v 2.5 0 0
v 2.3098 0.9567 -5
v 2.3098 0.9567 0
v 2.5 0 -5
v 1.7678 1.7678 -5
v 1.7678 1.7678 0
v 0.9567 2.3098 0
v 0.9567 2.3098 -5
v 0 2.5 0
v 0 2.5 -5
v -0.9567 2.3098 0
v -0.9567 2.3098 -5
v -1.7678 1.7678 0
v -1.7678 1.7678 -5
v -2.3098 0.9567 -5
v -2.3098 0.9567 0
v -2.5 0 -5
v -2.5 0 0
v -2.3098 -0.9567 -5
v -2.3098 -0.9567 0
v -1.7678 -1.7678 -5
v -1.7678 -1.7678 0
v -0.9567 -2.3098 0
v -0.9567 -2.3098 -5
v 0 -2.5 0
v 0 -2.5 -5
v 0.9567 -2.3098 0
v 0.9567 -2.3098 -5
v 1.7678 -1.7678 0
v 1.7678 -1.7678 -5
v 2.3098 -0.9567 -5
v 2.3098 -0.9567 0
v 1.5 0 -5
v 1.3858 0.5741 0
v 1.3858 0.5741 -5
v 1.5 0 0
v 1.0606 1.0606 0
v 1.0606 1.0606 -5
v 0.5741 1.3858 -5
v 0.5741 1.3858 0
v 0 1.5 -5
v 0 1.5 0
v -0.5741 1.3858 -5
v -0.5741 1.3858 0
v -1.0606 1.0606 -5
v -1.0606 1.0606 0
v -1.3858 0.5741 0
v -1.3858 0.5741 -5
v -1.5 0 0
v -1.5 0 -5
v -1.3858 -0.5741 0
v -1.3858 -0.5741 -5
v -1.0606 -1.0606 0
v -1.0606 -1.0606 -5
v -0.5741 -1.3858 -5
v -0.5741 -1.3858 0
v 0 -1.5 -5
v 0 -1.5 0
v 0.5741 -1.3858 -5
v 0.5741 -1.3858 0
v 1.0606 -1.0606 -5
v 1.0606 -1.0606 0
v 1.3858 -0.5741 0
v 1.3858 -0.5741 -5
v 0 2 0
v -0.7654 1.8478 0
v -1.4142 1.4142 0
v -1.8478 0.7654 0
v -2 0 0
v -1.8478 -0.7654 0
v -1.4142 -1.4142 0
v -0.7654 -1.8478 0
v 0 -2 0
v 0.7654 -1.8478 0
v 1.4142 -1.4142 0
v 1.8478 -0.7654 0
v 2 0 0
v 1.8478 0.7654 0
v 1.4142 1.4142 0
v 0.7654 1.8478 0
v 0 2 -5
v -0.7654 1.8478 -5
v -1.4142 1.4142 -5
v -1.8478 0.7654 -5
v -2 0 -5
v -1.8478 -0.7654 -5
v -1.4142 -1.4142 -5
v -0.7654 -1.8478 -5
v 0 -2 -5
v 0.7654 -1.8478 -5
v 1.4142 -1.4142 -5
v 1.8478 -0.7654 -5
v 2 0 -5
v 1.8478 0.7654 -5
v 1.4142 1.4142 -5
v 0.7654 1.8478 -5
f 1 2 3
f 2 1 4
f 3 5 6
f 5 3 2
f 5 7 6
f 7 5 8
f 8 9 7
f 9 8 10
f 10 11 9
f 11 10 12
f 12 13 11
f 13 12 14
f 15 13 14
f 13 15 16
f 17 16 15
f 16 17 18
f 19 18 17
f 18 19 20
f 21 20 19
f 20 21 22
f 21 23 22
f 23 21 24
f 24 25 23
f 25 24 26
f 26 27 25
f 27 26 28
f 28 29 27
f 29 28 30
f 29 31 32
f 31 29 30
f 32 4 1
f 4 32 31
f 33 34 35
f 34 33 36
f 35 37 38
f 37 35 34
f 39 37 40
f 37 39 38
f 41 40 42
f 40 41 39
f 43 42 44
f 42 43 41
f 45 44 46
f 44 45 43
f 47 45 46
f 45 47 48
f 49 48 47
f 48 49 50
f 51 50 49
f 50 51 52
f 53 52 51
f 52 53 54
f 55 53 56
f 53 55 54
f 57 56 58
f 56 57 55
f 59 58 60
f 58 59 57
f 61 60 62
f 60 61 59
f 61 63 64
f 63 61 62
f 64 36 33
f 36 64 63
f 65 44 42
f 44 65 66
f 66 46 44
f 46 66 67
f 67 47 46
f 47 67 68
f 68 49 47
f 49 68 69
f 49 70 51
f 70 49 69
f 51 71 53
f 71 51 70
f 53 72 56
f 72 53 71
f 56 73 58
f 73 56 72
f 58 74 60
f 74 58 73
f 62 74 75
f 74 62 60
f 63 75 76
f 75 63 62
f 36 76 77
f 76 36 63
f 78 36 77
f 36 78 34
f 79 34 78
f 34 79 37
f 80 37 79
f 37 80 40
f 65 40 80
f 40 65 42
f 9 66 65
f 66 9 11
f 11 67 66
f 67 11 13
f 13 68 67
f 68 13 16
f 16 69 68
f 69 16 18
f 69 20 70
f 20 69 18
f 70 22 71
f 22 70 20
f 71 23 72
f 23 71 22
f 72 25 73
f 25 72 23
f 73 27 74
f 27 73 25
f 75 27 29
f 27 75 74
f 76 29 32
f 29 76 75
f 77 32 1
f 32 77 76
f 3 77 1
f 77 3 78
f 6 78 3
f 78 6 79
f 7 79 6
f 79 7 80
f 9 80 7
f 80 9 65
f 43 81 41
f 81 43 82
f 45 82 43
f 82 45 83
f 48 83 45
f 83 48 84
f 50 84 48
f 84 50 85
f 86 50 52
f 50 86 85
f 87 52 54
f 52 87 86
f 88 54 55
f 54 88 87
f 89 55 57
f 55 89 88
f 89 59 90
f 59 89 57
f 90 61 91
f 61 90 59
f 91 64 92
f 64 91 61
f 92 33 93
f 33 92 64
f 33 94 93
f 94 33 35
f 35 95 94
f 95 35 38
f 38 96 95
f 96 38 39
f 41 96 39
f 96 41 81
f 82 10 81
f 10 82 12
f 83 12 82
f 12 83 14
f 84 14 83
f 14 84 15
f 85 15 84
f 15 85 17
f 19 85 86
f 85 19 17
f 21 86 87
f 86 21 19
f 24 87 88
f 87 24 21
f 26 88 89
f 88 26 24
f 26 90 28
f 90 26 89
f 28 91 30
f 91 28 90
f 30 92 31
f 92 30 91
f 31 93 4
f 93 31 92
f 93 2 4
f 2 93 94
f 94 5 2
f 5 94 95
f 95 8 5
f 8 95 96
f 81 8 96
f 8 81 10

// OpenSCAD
// file: ../p/4-4disc.scad
use <../lib.scad>
$fa=1; $fs=0.2;
function ldraw_lib__4_4disc(realsolid=false) = [
// 0 Disc 1.0
// 0 Name: 4-4disc.dat
// 0 Author: James Jessiman
// 0 !LDRAW_ORG Primitive UPDATE 2002-02
// 0 !LICENSE Licensed under CC BY 2.0 and CC BY 4.0 : see CAreadme.txt
// 
// 0 BFC CERTIFY CCW
  [0,"BFC","CERTIFY"],
  [0,"BFC","CCW"],
// 
// 0 !HISTORY 1998-12-15 [PTadmin] Official Update 1998-10
// 0 !HISTORY 2002-03-23 [sbliss] Added BFC statement
// 0 !HISTORY 2002-04-25 [PTadmin] Official Update 2002-02
// 0 !HISTORY 2007-06-24 [PTadmin] Header formatted for Contributor Agreement
// 0 !HISTORY 2008-07-01 [PTadmin] Official Update 2008-01
// 
// 
// 3 16 0 0 0 1 0 0 0.9239 0 0.3827
  [3,16,0,0,0,1,0,0,0.9239,0,0.3827],
// 3 16 0 0 0 0.9239 0 0.3827 0.7071 0 0.7071
  [3,16,0,0,0,0.9239,0,0.3827,0.7071,0,0.7071],
// 3 16 0 0 0 0.7071 0 0.7071 0.3827 0 0.9239
  [3,16,0,0,0,0.7071,0,0.7071,0.3827,0,0.9239],
// 3 16 0 0 0 0.3827 0 0.9239 0 0 1
  [3,16,0,0,0,0.3827,0,0.9239,0,0,1],
// 3 16 0 0 0 0 0 1 -0.3827 0 0.9239
  [3,16,0,0,0,0,0,1,-0.3827,0,0.9239],
// 3 16 0 0 0 -0.3827 0 0.9239 -0.7071 0 0.7071
  [3,16,0,0,0,-0.3827,0,0.9239,-0.7071,0,0.7071],
// 3 16 0 0 0 -0.7071 0 0.7071 -0.9239 0 0.3827
  [3,16,0,0,0,-0.7071,0,0.7071,-0.9239,0,0.3827],
// 3 16 0 0 0 -0.9239 0 0.3827 -1 0 -0
  [3,16,0,0,0,-0.9239,0,0.3827,-1,0,-0],
// 3 16 0 0 0 -1 0 -0 -0.9239 0 -0.3827
  [3,16,0,0,0,-1,0,-0,-0.9239,0,-0.3827],
// 3 16 0 0 0 -0.9239 0 -0.3827 -0.7071 0 -0.7071
  [3,16,0,0,0,-0.9239,0,-0.3827,-0.7071,0,-0.7071],
// 3 16 0 0 0 -0.7071 0 -0.7071 -0.3827 0 -0.9239
  [3,16,0,0,0,-0.7071,0,-0.7071,-0.3827,0,-0.9239],
// 3 16 0 0 0 -0.3827 0 -0.9239 0 0 -1
  [3,16,0,0,0,-0.3827,0,-0.9239,0,0,-1],
// 3 16 0 0 0 0 0 -1 0.3827 0 -0.9239
  [3,16,0,0,0,0,0,-1,0.3827,0,-0.9239],
// 3 16 0 0 0 0.3827 0 -0.9239 0.7071 0 -0.7071
  [3,16,0,0,0,0.3827,0,-0.9239,0.7071,0,-0.7071],
// 3 16 0 0 0 0.7071 0 -0.7071 0.9239 0 -0.3827
  [3,16,0,0,0,0.7071,0,-0.7071,0.9239,0,-0.3827],
// 3 16 0 0 0 0.9239 0 -0.3827 1 0 0
  [3,16,0,0,0,0.9239,0,-0.3827,1,0,0],
// 0
];
module ldraw_lib__4_4disc(step=0, col=false, unit=2/5, alt=false, line=0.2, solid=!$preview)
    makepoly(ldraw_lib__4_4disc(solid), step=step, col=col, unit=unit, alt=alt, line=line, solid=solid);
ldraw_lib__4_4disc(line=0.2);
// file: ../p/stud3.scad
use <../lib.scad>
use <4-4cyli.scad>
use <4-4disc.scad>
use <4-4edge.scad>
$fa=1; $fs=0.2;
function ldraw_lib__stud3(realsolid=false) = realsolid ? 
    [openscad(translate([0,0,-eps()], o=cylinder(4+eps(), r=4)),2)] : [
// 0 Stud Tube Solid
// 0 Name: stud3.dat
// 0 Author: James Jessiman
// 0 !LDRAW_ORG Primitive UPDATE 2012-01
// 0 !LICENSE Licensed under CC BY 2.0 and CC BY 4.0 : see CAreadme.txt
// 
// 0 BFC CERTIFY CCW
  [0,"BFC","CERTIFY"],
  [0,"BFC","CCW"],
// 
// 0 !HISTORY 2002-04-04 [sbliss] Modified for BFC compliance
// 0 !HISTORY 2002-04-25 [PTadmin] Official Update 2002-02
// 0 !HISTORY 2007-06-24 [PTadmin] Header formatted for Contributor Agreement
// 0 !HISTORY 2008-07-01 [PTadmin] Official Update 2008-01
// 0 !HISTORY 2012-02-16 [Philo] Changed to CCW
// 0 !HISTORY 2012-03-30 [PTadmin] Official Update 2012-01
// 
// 
// 1 16 0 -4 0 4 0 0 0 1 0 0 0 4 4-4edge.dat
  [1,16,0,-4,0,4,0,0,0,1,0,0,0,4, ldraw_lib__4_4edge(realsolid)],
// 1 16 0 0 0 4 0 0 0 1 0 0 0 4 4-4edge.dat
  [1,16,0,0,0,4,0,0,0,1,0,0,0,4, ldraw_lib__4_4edge(realsolid)],
// 1 16 0 -4 0 4 0 0 0 1 0 0 0 4 4-4disc.dat
  [1,16,0,-4,0,4,0,0,0,1,0,0,0,4, ldraw_lib__4_4disc(realsolid)],
// 1 16 0 -4 0 4 0 0 0 4 0 0 0 4 4-4cyli.dat
  [1,16,0,-4,0,4,0,0,0,4,0,0,0,4, ldraw_lib__4_4cyli(realsolid)],
];
module ldraw_lib__stud3(step=0, col=false, unit=2/5, alt=false, line=0.2, solid=!$preview)
    makepoly(ldraw_lib__stud3(solid), step=step, col=col, unit=unit, alt=alt, line=line, solid=solid);
ldraw_lib__stud3(line=0.2);
// file: ../p/stud.scad
use <../lib.scad>
use <4-4cyli.scad>
use <4-4disc.scad>
use <4-4edge.scad>
$fa=1; $fs=0.2;
function ldraw_lib__stud(realsolid=false) = realsolid ? 
    [openscad(translate([0,0,-eps()], o=cylinder(4+eps(), r=6)),2)] : [
// 0 Stud
// 0 Name: stud.dat
// 0 Author: James Jessiman
// 0 !LDRAW_ORG Primitive UPDATE 2012-01
// 0 !LICENSE Licensed under CC BY 2.0 and CC BY 4.0 : see CAreadme.txt
// 
// 0 BFC CERTIFY CCW
  [0,"BFC","CERTIFY"],
  [0,"BFC","CCW"],
// 
// 0 !HISTORY 2002-04-04 [sbliss] Modified for BFC compliance
// 0 !HISTORY 2002-04-25 [PTadmin] Official Update 2002-02
// 0 !HISTORY 2007-06-24 [PTadmin] Header formatted for Contributor Agreement
// 0 !HISTORY 2008-07-01 [PTadmin] Official Update 2008-01
// 0 !HISTORY 2012-02-16 [Philo] Changed to CCW
// 0 !HISTORY 2012-03-30 [PTadmin] Official Update 2012-01
// 
// 
// 1 16 0 0 0 6 0 0 0 1 0 0 0 6 4-4edge.dat
  [1,16,0,0,0,6,0,0,0,1,0,0,0,6, ldraw_lib__4_4edge(realsolid)],
// 1 16 0 -4 0 6 0 0 0 1 0 0 0 6 4-4edge.dat
  [1,16,0,-4,0,6,0,0,0,1,0,0,0,6, ldraw_lib__4_4edge(realsolid)],
// 1 16 0 0 0 6 0 0 0 -4 0 0 0 6 4-4cyli.dat
  [1,16,0,0,0,6,0,0,0,-4,0,0,0,6, ldraw_lib__4_4cyli(realsolid)],
// 1 16 0 -4 0 6 0 0 0 1 0 0 0 6 4-4disc.dat
  [1,16,0,-4,0,6,0,0,0,1,0,0,0,6, ldraw_lib__4_4disc(realsolid)],
];
module ldraw_lib__stud(step=0, col=false, unit=2/5, alt=false, line=0.2, solid=!$preview)
    makepoly(ldraw_lib__stud(solid), step=step, col=col, unit=unit, alt=alt, line=line, solid=solid);
ldraw_lib__stud(line=0.2);
// file: ../p/box5.scad
use <../lib.scad>
$fa=1; $fs=0.2;
function ldraw_lib__box5(realsolid=false) = [
// 0 Box with 5 Faces and All Edges
// 0 Name: box5.dat
// 0 Author: James Jessiman
// 0 !LDRAW_ORG Primitive UPDATE 2012-01
// 0 !LICENSE Licensed under CC BY 2.0 and CC BY 4.0 : see CAreadme.txt
// 
// 0 BFC CERTIFY CCW
  [0,"BFC","CERTIFY"],
  [0,"BFC","CCW"],
// 
// 0 !HISTORY 2002-04-03 [sbliss] Modified for BFC compliance
// 0 !HISTORY 2002-04-25 [PTadmin] Official Update 2002-02
// 0 !HISTORY 2007-06-24 [PTadmin] Header formatted for Contributor Agreement
// 0 !HISTORY 2008-07-01 [PTadmin] Official Update 2008-01
// 0 !HISTORY 2012-02-16 [Philo] Changed to CCW
// 0 !HISTORY 2012-03-30 [PTadmin] Official Update 2012-01
// 
// 
// 2 24 1 1 1 -1 1 1
  [2,24,1,1,1,-1,1,1],
// 2 24 -1 1 1 -1 1 -1
  [2,24,-1,1,1,-1,1,-1],
// 2 24 -1 1 -1 1 1 -1
  [2,24,-1,1,-1,1,1,-1],
// 2 24 1 1 -1 1 1 1
  [2,24,1,1,-1,1,1,1],
// 2 24 1 0 1 -1 0 1
  [2,24,1,0,1,-1,0,1],
// 2 24 -1 0 1 -1 0 -1
  [2,24,-1,0,1,-1,0,-1],
// 2 24 -1 0 -1 1 0 -1
  [2,24,-1,0,-1,1,0,-1],
// 2 24 1 0 -1 1 0 1
  [2,24,1,0,-1,1,0,1],
// 2 24 1 0 1 1 1 1
  [2,24,1,0,1,1,1,1],
// 2 24 -1 0 1 -1 1 1
  [2,24,-1,0,1,-1,1,1],
// 2 24 1 0 -1 1 1 -1
  [2,24,1,0,-1,1,1,-1],
// 2 24 -1 0 -1 -1 1 -1
  [2,24,-1,0,-1,-1,1,-1],
// 4 16 -1 1 1 1 1 1 1 1 -1 -1 1 -1
  [4,16,-1,1,1,1,1,1,1,1,-1,-1,1,-1],
// 4 16 -1 1 1 -1 0 1 1 0 1 1 1 1
  [4,16,-1,1,1,-1,0,1,1,0,1,1,1,1],
// 4 16 -1 1 -1 -1 0 -1 -1 0 1 -1 1 1
  [4,16,-1,1,-1,-1,0,-1,-1,0,1,-1,1,1],
// 4 16 1 1 -1 1 0 -1 -1 0 -1 -1 1 -1
  [4,16,1,1,-1,1,0,-1,-1,0,-1,-1,1,-1],
// 4 16 1 1 1 1 0 1 1 0 -1 1 1 -1
  [4,16,1,1,1,1,0,1,1,0,-1,1,1,-1],
];
module ldraw_lib__box5(step=0, col=false, unit=2/5, alt=false, line=0.2, solid=!$preview)
    makepoly(ldraw_lib__box5(solid), step=step, col=col, unit=unit, alt=alt, line=line, solid=solid);
ldraw_lib__box5(line=0.2);
// file: ../p/box4t.scad
use <../lib.scad>
$fa=1; $fs=0.2;
function ldraw_lib__box4t(realsolid=false) = [
// 0 Box with 4 Adjacent Faces and All Edges
// 0 Name: box4t.dat
// 0 Author: Tore Eriksson [Tore_Eriksson]
// 0 !LDRAW_ORG Primitive UPDATE 2003-02
// 0 !LICENSE Licensed under CC BY 2.0 and CC BY 4.0 : see CAreadme.txt
// 
// 0 BFC CERTIFY CCW
  [0,"BFC","CERTIFY"],
  [0,"BFC","CCW"],
// 
// 0 !HISTORY 1997-09-29 [PTadmin] Official Update 1997-15
// 0 !HISTORY 2002-08-31 [izanette] Modified with WINDZ for BFC compliance
// 0 !HISTORY 2003-08-01 [PTadmin] Official Update 2003-02
// 0 !HISTORY 2007-06-24 [PTadmin] Header formatted for Contributor Agreement
// 0 !HISTORY 2008-07-01 [PTadmin] Official Update 2008-01
// 
// 
// 2 24 1 1 1 -1 1 1
  [2,24,1,1,1,-1,1,1],
// 2 24 -1 1 1 -1 1 -1
  [2,24,-1,1,1,-1,1,-1],
// 2 24 -1 1 -1 1 1 -1
  [2,24,-1,1,-1,1,1,-1],
// 2 24 1 1 -1 1 1 1
  [2,24,1,1,-1,1,1,1],
// 2 24 1 0 1 -1 0 1
  [2,24,1,0,1,-1,0,1],
// 2 24 -1 0 1 -1 0 -1
  [2,24,-1,0,1,-1,0,-1],
// 2 24 -1 0 -1 1 0 -1
  [2,24,-1,0,-1,1,0,-1],
// 2 24 1 0 -1 1 0 1
  [2,24,1,0,-1,1,0,1],
// 2 24 1 0 1 1 1 1
  [2,24,1,0,1,1,1,1],
// 2 24 -1 0 1 -1 1 1
  [2,24,-1,0,1,-1,1,1],
// 2 24 1 0 -1 1 1 -1
  [2,24,1,0,-1,1,1,-1],
// 2 24 -1 0 -1 -1 1 -1
  [2,24,-1,0,-1,-1,1,-1],
// 4 16 1 1 1 1 1 -1 -1 1 -1 -1 1 1
  [4,16,1,1,1,1,1,-1,-1,1,-1,-1,1,1],
// 4 16 1 1 1 -1 1 1 -1 0 1 1 0 1
  [4,16,1,1,1,-1,1,1,-1,0,1,1,0,1],
// 4 16 -1 1 1 -1 1 -1 -1 0 -1 -1 0 1
  [4,16,-1,1,1,-1,1,-1,-1,0,-1,-1,0,1],
// 0 4 16 -1 1 -1 -1 0 -1 1 0 -1 1 1 -1
// 4 16 1 1 -1 1 1 1 1 0 1 1 0 -1
  [4,16,1,1,-1,1,1,1,1,0,1,1,0,-1],
// 0
];
module ldraw_lib__box4t(step=0, col=false, unit=2/5, alt=false, line=0.2, solid=!$preview)
    makepoly(ldraw_lib__box4t(solid), step=step, col=col, unit=unit, alt=alt, line=line, solid=solid);
ldraw_lib__box4t(line=0.2);
// file: s/3004s01.scad
use <../../lib.scad>
use <../../p/box4t.scad>
use <../../p/box5.scad>
use <../../p/stud.scad>
use <../../p/stud3.scad>
$fa=1; $fs=0.2;
function ldraw_lib__s__3004s01(realsolid=false) = [
// 0 ~Brick  1 x  2 without Front Face
// 0 Name: s\3004s01.dat
// 0 Author: James Jessiman
// 0 !LDRAW_ORG Subpart UPDATE 2003-03
// 0 !LICENSE Licensed under CC BY 2.0 and CC BY 4.0 : see CAreadme.txt
// 
// 0 BFC CERTIFY CCW
  [0,"BFC","CERTIFY"],
  [0,"BFC","CCW"],
// 
// 0 !HISTORY 2003-09-07 [jriley] Subfiling, BFC
// 0 !HISTORY 2003-12-19 [PTadmin] Official Update 2003-03
// 0 !HISTORY 2007-08-29 [PTadmin] Header formatted for Contributor Agreement
// 0 !HISTORY 2008-07-01 [PTadmin] Official Update 2008-01
// 
// 
// 1 16 0 4 0 1 0 0 0 -5 0 0 0 1 stud3.dat
  [1,16,0,4,0,1,0,0,0,-5,0,0,0,1, ldraw_lib__stud3(realsolid)],
// 0 BFC INVERTNEXT
  [0,"BFC","INVERTNEXT"],
// 1 16 0 24 0 16 0 0 0 -20 0 0 0 6 box5.dat
  [1,16,0,24,0,16,0,0,0,-20,0,0,0,6, ldraw_lib__box5(realsolid)],
// 4 16 20 24 10 16 24 6 -16 24 6 -20 24 10
  [4,16,20,24,10,16,24,6,-16,24,6,-20,24,10],
// 4 16 -20 24 10 -16 24 6 -16 24 -6 -20 24 -10
  [4,16,-20,24,10,-16,24,6,-16,24,-6,-20,24,-10],
// 4 16 -20 24 -10 -16 24 -6 16 24 -6 20 24 -10
  [4,16,-20,24,-10,-16,24,-6,16,24,-6,20,24,-10],
// 4 16 20 24 -10 16 24 -6 16 24 6 20 24 10
  [4,16,20,24,-10,16,24,-6,16,24,6,20,24,10],
// 1 16 0 24 0 20 0 0 0 -24 0 0 0 10 box4t.dat
  [1,16,0,24,0,20,0,0,0,-24,0,0,0,10, ldraw_lib__box4t(realsolid)],
// 1 16 10 0 0 1 0 0 0 1 0 0 0 1 stud.dat
  [1,16,10,0,0,1,0,0,0,1,0,0,0,1, ldraw_lib__stud(realsolid)],
// 1 16 -10 0 0 1 0 0 0 1 0 0 0 1 stud.dat
  [1,16,-10,0,0,1,0,0,0,1,0,0,0,1, ldraw_lib__stud(realsolid)],
// 0
];
module ldraw_lib__s__3004s01(step=0, col=false, unit=2/5, alt=false, line=0.2, solid=!$preview)
    makepoly(ldraw_lib__s__3004s01(solid), step=step, col=col, unit=unit, alt=alt, line=line, solid=solid);
ldraw_lib__s__3004s01(line=0.2);
// file: ../p/4-4edge.scad
use <../lib.scad>
$fa=1; $fs=0.2;
function ldraw_lib__4_4edge(realsolid=false) = [
// 0 Circle 1.0
// 0 Name: 4-4edge.dat
// 0 Author: James Jessiman
// 0 !LDRAW_ORG Primitive UPDATE 2017-01
// 0 !LICENSE Licensed under CC BY 2.0 and CC BY 4.0 : see CAreadme.txt
// 
// 0 BFC CERTIFY CCW
  [0,"BFC","CERTIFY"],
  [0,"BFC","CCW"],
// 
// 0 !HISTORY 1998-12-15 [PTadmin] Official Update 1998-10
// 0 !HISTORY 2005-12-28 [PTadmin] Official Update 2005-01
// 0 !HISTORY 2007-06-24 [PTadmin] Header formatted for Contributor Agreement
// 0 !HISTORY 2008-07-01 [PTadmin] Official Update 2008-01
// 0 !HISTORY 2017-01-15 [Steffen] BFCed
// 0 !HISTORY 2017-12-30 [PTadmin] Official Update 2017-01
// 
// 
// 2 24 1 0 0 0.9239 0 0.3827
  [2,24,1,0,0,0.9239,0,0.3827],
// 2 24 0.9239 0 0.3827 0.7071 0 0.7071
  [2,24,0.9239,0,0.3827,0.7071,0,0.7071],
// 2 24 0.7071 0 0.7071 0.3827 0 0.9239
  [2,24,0.7071,0,0.7071,0.3827,0,0.9239],
// 2 24 0.3827 0 0.9239 0 0 1
  [2,24,0.3827,0,0.9239,0,0,1],
// 2 24 0 0 1 -0.3827 0 0.9239
  [2,24,0,0,1,-0.3827,0,0.9239],
// 2 24 -0.3827 0 0.9239 -0.7071 0 0.7071
  [2,24,-0.3827,0,0.9239,-0.7071,0,0.7071],
// 2 24 -0.7071 0 0.7071 -0.9239 0 0.3827
  [2,24,-0.7071,0,0.7071,-0.9239,0,0.3827],
// 2 24 -0.9239 0 0.3827 -1 0 -0
  [2,24,-0.9239,0,0.3827,-1,0,-0],
// 2 24 -1 0 -0 -0.9239 0 -0.3827
  [2,24,-1,0,-0,-0.9239,0,-0.3827],
// 2 24 -0.9239 0 -0.3827 -0.7071 0 -0.7071
  [2,24,-0.9239,0,-0.3827,-0.7071,0,-0.7071],
// 2 24 -0.7071 0 -0.7071 -0.3827 0 -0.9239
  [2,24,-0.7071,0,-0.7071,-0.3827,0,-0.9239],
// 2 24 -0.3827 0 -0.9239 0 0 -1
  [2,24,-0.3827,0,-0.9239,0,0,-1],
// 2 24 0 0 -1 0.3827 0 -0.9239
  [2,24,0,0,-1,0.3827,0,-0.9239],
// 2 24 0.3827 0 -0.9239 0.7071 0 -0.7071
  [2,24,0.3827,0,-0.9239,0.7071,0,-0.7071],
// 2 24 0.7071 0 -0.7071 0.9239 0 -0.3827
  [2,24,0.7071,0,-0.7071,0.9239,0,-0.3827],
// 2 24 0.9239 0 -0.3827 1 0 0
  [2,24,0.9239,0,-0.3827,1,0,0],
];
module ldraw_lib__4_4edge(step=0, col=false, unit=2/5, alt=false, line=0.2, solid=!$preview)
    makepoly(ldraw_lib__4_4edge(solid), step=step, col=col, unit=unit, alt=alt, line=line, solid=solid);
ldraw_lib__4_4edge(line=0.2);
// file: ../p/4-4cyli.scad
use <../lib.scad>
$fa=1; $fs=0.2;
function ldraw_lib__4_4cyli(realsolid=false) = [
// 0 Cylinder 1.0
// 0 Name: 4-4cyli.dat
// 0 Author: James Jessiman
// 0 !LDRAW_ORG Primitive UPDATE 2005-01
// 0 !LICENSE Licensed under CC BY 2.0 and CC BY 4.0 : see CAreadme.txt
// 
// 0 BFC CERTIFY CCW
  [0,"BFC","CERTIFY"],
  [0,"BFC","CCW"],
// 
// 0 !HISTORY 1998-12-15 [PTadmin] Official Update 1998-10
// 0 !HISTORY 2002-03-23 [sbliss] Added BFC statement; merged headers from files in distributions LDraw 0.27 and Complete.
// 0 !HISTORY 2002-04-25 [PTadmin] Official Update 2002-02
// 0 !HISTORY 2004-12-14 [guyvivan] BFC CCW
// 0 !HISTORY 2005-12-28 [PTadmin] Official Update 2005-01
// 0 !HISTORY 2007-06-24 [PTadmin] Header formatted for Contributor Agreement
// 0 !HISTORY 2008-07-01 [PTadmin] Official Update 2008-01
// 
// 
// 4 16 1 1 0 0.9239 1 0.3827 0.9239 0 0.3827 1 0 0
  [4,16,1,1,0,0.9239,1,0.3827,0.9239,0,0.3827,1,0,0],
// 5 24 1 0 0 1 1 0 0.9239 0 0.3827 0.9239 0 -0.3827
  [5,24,1,0,0,1,1,0,0.9239,0,0.3827,0.9239,0,-0.3827],
// 4 16 0.9239 1 0.3827 0.7071 1 0.7071 0.7071 0 0.7071 0.9239 0 0.3827
  [4,16,0.9239,1,0.3827,0.7071,1,0.7071,0.7071,0,0.7071,0.9239,0,0.3827],
// 5 24 0.9239 0 0.3827 0.9239 1 0.3827 0.7071 0 0.7071 1 0 0
  [5,24,0.9239,0,0.3827,0.9239,1,0.3827,0.7071,0,0.7071,1,0,0],
// 4 16 0.7071 1 0.7071 0.3827 1 0.9239 0.3827 0 0.9239 0.7071 0 0.7071
  [4,16,0.7071,1,0.7071,0.3827,1,0.9239,0.3827,0,0.9239,0.7071,0,0.7071],
// 5 24 0.7071 0 0.7071 0.7071 1 0.7071 0.3827 0 0.9239 0.9239 0 0.3827
  [5,24,0.7071,0,0.7071,0.7071,1,0.7071,0.3827,0,0.9239,0.9239,0,0.3827],
// 4 16 0.3827 1 0.9239 0 1 1 0 0 1 0.3827 0 0.9239
  [4,16,0.3827,1,0.9239,0,1,1,0,0,1,0.3827,0,0.9239],
// 5 24 0.3827 0 0.9239 0.3827 1 0.9239 0 0 1 0.7071 0 0.7071
  [5,24,0.3827,0,0.9239,0.3827,1,0.9239,0,0,1,0.7071,0,0.7071],
// 4 16 0 1 1 -0.3827 1 0.9239 -0.3827 0 0.9239 0 0 1
  [4,16,0,1,1,-0.3827,1,0.9239,-0.3827,0,0.9239,0,0,1],
// 5 24 0 0 1 0 1 1 -0.3827 0 0.9239 0.3827 0 0.9239
  [5,24,0,0,1,0,1,1,-0.3827,0,0.9239,0.3827,0,0.9239],
// 4 16 -0.3827 1 0.9239 -0.7071 1 0.7071 -0.7071 0 0.7071 -0.3827 0 0.9239
  [4,16,-0.3827,1,0.9239,-0.7071,1,0.7071,-0.7071,0,0.7071,-0.3827,0,0.9239],
// 5 24 -0.3827 0 0.9239 -0.3827 1 0.9239 -0.7071 0 0.7071 0 0 1
  [5,24,-0.3827,0,0.9239,-0.3827,1,0.9239,-0.7071,0,0.7071,0,0,1],
// 4 16 -0.7071 1 0.7071 -0.9239 1 0.3827 -0.9239 0 0.3827 -0.7071 0 0.7071
  [4,16,-0.7071,1,0.7071,-0.9239,1,0.3827,-0.9239,0,0.3827,-0.7071,0,0.7071],
// 5 24 -0.7071 0 0.7071 -0.7071 1 0.7071 -0.9239 0 0.3827 -0.3827 0 0.9239
  [5,24,-0.7071,0,0.7071,-0.7071,1,0.7071,-0.9239,0,0.3827,-0.3827,0,0.9239],
// 4 16 -0.9239 1 0.3827 -1 1 0 -1 0 0 -0.9239 0 0.3827
  [4,16,-0.9239,1,0.3827,-1,1,0,-1,0,0,-0.9239,0,0.3827],
// 5 24 -0.9239 0 0.3827 -0.9239 1 0.3827 -1 0 0 -0.7071 0 0.7071
  [5,24,-0.9239,0,0.3827,-0.9239,1,0.3827,-1,0,0,-0.7071,0,0.7071],
// 4 16 -1 1 0 -0.9239 1 -0.3827 -0.9239 0 -0.3827 -1 0 0
  [4,16,-1,1,0,-0.9239,1,-0.3827,-0.9239,0,-0.3827,-1,0,0],
// 5 24 -1 0 0 -1 1 0 -0.9239 0 -0.3827 -0.9239 0 0.3827
  [5,24,-1,0,0,-1,1,0,-0.9239,0,-0.3827,-0.9239,0,0.3827],
// 4 16 -0.9239 1 -0.3827 -0.7071 1 -0.7071 -0.7071 0 -0.7071 -0.9239 0 -0.3827
  [4,16,-0.9239,1,-0.3827,-0.7071,1,-0.7071,-0.7071,0,-0.7071,-0.9239,0,-0.3827],
// 5 24 -0.9239 0 -0.3827 -0.9239 1 -0.3827 -0.7071 0 -0.7071 -1 0 0
  [5,24,-0.9239,0,-0.3827,-0.9239,1,-0.3827,-0.7071,0,-0.7071,-1,0,0],
// 4 16 -0.7071 1 -0.7071 -0.3827 1 -0.9239 -0.3827 0 -0.9239 -0.7071 0 -0.7071
  [4,16,-0.7071,1,-0.7071,-0.3827,1,-0.9239,-0.3827,0,-0.9239,-0.7071,0,-0.7071],
// 5 24 -0.7071 0 -0.7071 -0.7071 1 -0.7071 -0.3827 0 -0.9239 -0.9239 0 -0.3827
  [5,24,-0.7071,0,-0.7071,-0.7071,1,-0.7071,-0.3827,0,-0.9239,-0.9239,0,-0.3827],
// 4 16 -0.3827 1 -0.9239 0 1 -1 0 0 -1 -0.3827 0 -0.9239
  [4,16,-0.3827,1,-0.9239,0,1,-1,0,0,-1,-0.3827,0,-0.9239],
// 5 24 -0.3827 0 -0.9239 -0.3827 1 -0.9239 0 0 -1 -0.7071 0 -0.7071
  [5,24,-0.3827,0,-0.9239,-0.3827,1,-0.9239,0,0,-1,-0.7071,0,-0.7071],
// 4 16 0 1 -1 0.3827 1 -0.9239 0.3827 0 -0.9239 0 0 -1
  [4,16,0,1,-1,0.3827,1,-0.9239,0.3827,0,-0.9239,0,0,-1],
// 5 24 0 0 -1 0 1 -1 0.3827 0 -0.9239 -0.3827 0 -0.9239
  [5,24,0,0,-1,0,1,-1,0.3827,0,-0.9239,-0.3827,0,-0.9239],
// 4 16 0.3827 1 -0.9239 0.7071 1 -0.7071 0.7071 0 -0.7071 0.3827 0 -0.9239
  [4,16,0.3827,1,-0.9239,0.7071,1,-0.7071,0.7071,0,-0.7071,0.3827,0,-0.9239],
// 5 24 0.3827 0 -0.9239 0.3827 1 -0.9239 0.7071 0 -0.7071 0 0 -1
  [5,24,0.3827,0,-0.9239,0.3827,1,-0.9239,0.7071,0,-0.7071,0,0,-1],
// 4 16 0.7071 1 -0.7071 0.9239 1 -0.3827 0.9239 0 -0.3827 0.7071 0 -0.7071
  [4,16,0.7071,1,-0.7071,0.9239,1,-0.3827,0.9239,0,-0.3827,0.7071,0,-0.7071],
// 5 24 0.7071 0 -0.7071 0.7071 1 -0.7071 0.9239 0 -0.3827 0.3827 0 -0.9239
  [5,24,0.7071,0,-0.7071,0.7071,1,-0.7071,0.9239,0,-0.3827,0.3827,0,-0.9239],
// 4 16 0.9239 1 -0.3827 1 1 0 1 0 0 0.9239 0 -0.3827
  [4,16,0.9239,1,-0.3827,1,1,0,1,0,0,0.9239,0,-0.3827],
// 5 24 0.9239 0 -0.3827 0.9239 1 -0.3827 1 0 0 0.7071 0 -0.7071
  [5,24,0.9239,0,-0.3827,0.9239,1,-0.3827,1,0,0,0.7071,0,-0.7071],
// 0
];
module ldraw_lib__4_4cyli(step=0, col=false, unit=2/5, alt=false, line=0.2, solid=!$preview)
    makepoly(ldraw_lib__4_4cyli(solid), step=step, col=col, unit=unit, alt=alt, line=line, solid=solid);
ldraw_lib__4_4cyli(line=0.2);
// file: 3004.scad
use <../lib.scad>
use <s/3004s01.scad>
$fa=1; $fs=0.2;
function ldraw_lib__3004(realsolid=false) = [
// 0 Brick  1 x  2
// 0 Name: 3004.dat
// 0 Author: James Jessiman
// 0 !LDRAW_ORG Part UPDATE 2022-05
// 0 !LICENSE Licensed under CC BY 2.0 and CC BY 4.0 : see CAreadme.txt
// 
// 0 BFC CERTIFY CCW
  [0,"BFC","CERTIFY"],
  [0,"BFC","CCW"],
// 
// 0 !HISTORY 2001-10-26 [PTadmin] Official Update 2001-01
// 0 !HISTORY 2002-05-07 {unknown} BFC Certification
// 0 !HISTORY 2002-06-11 [PTadmin] Official Update 2002-03
// 0 !HISTORY 2007-05-07 [PTadmin] Header formatted for Contributor Agreement
// 0 !HISTORY 2008-07-01 [PTadmin] Official Update 2008-01
// 0 !HISTORY 2022-08-04 [MagFors] Using subfile
// 0 !HISTORY 2022-09-15 [PTadmin] Official Update 2022-05
// 
// 
// 1 16 0 0 0 1 0 0 0 1 0 0 0 1 s\3004s01.dat
  [1,16,0,0,0,1,0,0,0,1,0,0,0,1, ldraw_lib__s__3004s01(realsolid)],
// 4 16 -20 24 -10 20 24 -10 20 0 -10 -20 0 -10
  [4,16,-20,24,-10,20,24,-10,20,0,-10,-20,0,-10],
];
module ldraw_lib__3004(step=0, col=false, unit=2/5, alt=false, line=0.2, solid=!$preview)
    makepoly(ldraw_lib__3004(solid), step=step, col=col, unit=unit, alt=alt, line=line, solid=solid);
ldraw_lib__3004(line=0.2);
// file: ../p/4-4ring4.scad
use <../lib.scad>
$fa=1; $fs=0.2;
function ldraw_lib__4_4ring4(realsolid=false) = [
// 0 Ring  4 x 1.0
// 0 Name: 4-4ring4.dat
// 0 Author: James Jessiman
// 0 !LDRAW_ORG Primitive UPDATE 2009-01
// 0 !LICENSE Licensed under CC BY 2.0 and CC BY 4.0 : see CAreadme.txt
// 
// 0 BFC CERTIFY CCW
  [0,"BFC","CERTIFY"],
  [0,"BFC","CCW"],
// 
// 0 !HISTORY 1998-12-15 [PTadmin] Official Update 1998-10
// 0 !HISTORY 2002-04-08 [BrickCaster] Modified for BFC compliance
// 0 !HISTORY 2002-04-25 [PTadmin] Official Update 2002-02
// 0 !HISTORY 2007-06-24 [PTadmin] Header formatted for Contributor Agreement
// 0 !HISTORY 2008-07-01 [PTadmin] Official Update 2008-01
// 0 !HISTORY 2008-08-26 [cwdee] Switch polygon winding and rename
// 0 !HISTORY 2009-05-02 [PTadmin] Official Update 2009-01
// 
// 
// 4 16 -1.9135 0 4.6195 -1.5308 0 3.6956 0 0 4 0 0 5
  [4,16,-1.9135,0,4.6195,-1.5308,0,3.6956,0,0,4,0,0,5],
// 4 16 -3.5355 0 3.5355 -2.8284 0 2.8284 -1.5308 0 3.6956 -1.9135 0 4.6195
  [4,16,-3.5355,0,3.5355,-2.8284,0,2.8284,-1.5308,0,3.6956,-1.9135,0,4.6195],
// 4 16 -4.6195 0 1.9135 -3.6956 0 1.5308 -2.8284 0 2.8284 -3.5355 0 3.5355
  [4,16,-4.6195,0,1.9135,-3.6956,0,1.5308,-2.8284,0,2.8284,-3.5355,0,3.5355],
// 4 16 -5 0 0 -4 0 0 -3.6956 0 1.5308 -4.6195 0 1.9135
  [4,16,-5,0,0,-4,0,0,-3.6956,0,1.5308,-4.6195,0,1.9135],
// 4 16 -4.6195 0 -1.9135 -3.6956 0 -1.5308 -4 0 0 -5 0 0
  [4,16,-4.6195,0,-1.9135,-3.6956,0,-1.5308,-4,0,0,-5,0,0],
// 4 16 -3.5355 0 -3.5355 -2.8284 0 -2.8284 -3.6956 0 -1.5308 -4.6195 0 -1.9135
  [4,16,-3.5355,0,-3.5355,-2.8284,0,-2.8284,-3.6956,0,-1.5308,-4.6195,0,-1.9135],
// 4 16 -1.9135 0 -4.6195 -1.5308 0 -3.6956 -2.8284 0 -2.8284 -3.5355 0 -3.5355
  [4,16,-1.9135,0,-4.6195,-1.5308,0,-3.6956,-2.8284,0,-2.8284,-3.5355,0,-3.5355],
// 4 16 0 0 -5 0 0 -4 -1.5308 0 -3.6956 -1.9135 0 -4.6195
  [4,16,0,0,-5,0,0,-4,-1.5308,0,-3.6956,-1.9135,0,-4.6195],
// 4 16 1.9135 0 -4.6195 1.5308 0 -3.6956 0 0 -4 0 0 -5
  [4,16,1.9135,0,-4.6195,1.5308,0,-3.6956,0,0,-4,0,0,-5],
// 4 16 3.5355 0 -3.5355 2.8284 0 -2.8284 1.5308 0 -3.6956 1.9135 0 -4.6195
  [4,16,3.5355,0,-3.5355,2.8284,0,-2.8284,1.5308,0,-3.6956,1.9135,0,-4.6195],
// 4 16 4.6195 0 -1.9135 3.6956 0 -1.5308 2.8284 0 -2.8284 3.5355 0 -3.5355
  [4,16,4.6195,0,-1.9135,3.6956,0,-1.5308,2.8284,0,-2.8284,3.5355,0,-3.5355],
// 4 16 5 0 0 4 0 0 3.6956 0 -1.5308 4.6195 0 -1.9135
  [4,16,5,0,0,4,0,0,3.6956,0,-1.5308,4.6195,0,-1.9135],
// 4 16 4.6195 0 1.9135 3.6956 0 1.5308 4 0 0 5 0 0
  [4,16,4.6195,0,1.9135,3.6956,0,1.5308,4,0,0,5,0,0],
// 4 16 3.5355 0 3.5355 2.8284 0 2.8284 3.6956 0 1.5308 4.6195 0 1.9135
  [4,16,3.5355,0,3.5355,2.8284,0,2.8284,3.6956,0,1.5308,4.6195,0,1.9135],
// 4 16 1.9135 0 4.6195 1.5308 0 3.6956 2.8284 0 2.8284 3.5355 0 3.5355
  [4,16,1.9135,0,4.6195,1.5308,0,3.6956,2.8284,0,2.8284,3.5355,0,3.5355],
// 4 16 0 0 5 0 0 4 1.5308 0 3.6956 1.9135 0 4.6195
  [4,16,0,0,5,0,0,4,1.5308,0,3.6956,1.9135,0,4.6195],
// 0
];
module ldraw_lib__4_4ring4(step=0, col=false, unit=2/5, alt=false, line=0.2, solid=!$preview)
    makepoly(ldraw_lib__4_4ring4(solid), step=step, col=col, unit=unit, alt=alt, line=line, solid=solid);
ldraw_lib__4_4ring4(line=0.2);
// file: ../p/4-4ring3.scad
use <../lib.scad>
$fa=1; $fs=0.2;
function ldraw_lib__4_4ring3(realsolid=false) = [
// 0 Ring  3 x 1.0
// 0 Name: 4-4ring3.dat
// 0 Author: James Jessiman
// 0 !LDRAW_ORG Primitive UPDATE 2009-01
// 0 !LICENSE Licensed under CC BY 2.0 and CC BY 4.0 : see CAreadme.txt
// 
// 0 BFC CERTIFY CCW
  [0,"BFC","CERTIFY"],
  [0,"BFC","CCW"],
// 
// 0 !HISTORY 1998-12-15 [PTadmin] Official Update 1998-10
// 0 !HISTORY 2002-04-05 [hafhead] Added BFC statement
// 0 !HISTORY 2002-04-25 [PTadmin] Official Update 2002-02
// 0 !HISTORY 2007-06-24 [PTadmin] Header formatted for Contributor Agreement
// 0 !HISTORY 2008-07-01 [PTadmin] Official Update 2008-01
// 0 !HISTORY 2008-08-26 [cwdee] Switch polygon winding and rename
// 0 !HISTORY 2009-05-02 [PTadmin] Official Update 2009-01
// 
// 
// 4 16 -1.5308 0 3.6956 -1.1481 0 2.7717 0 0 3 0 0 4
  [4,16,-1.5308,0,3.6956,-1.1481,0,2.7717,0,0,3,0,0,4],
// 4 16 -2.8284 0 2.8284 -2.1213 0 2.1213 -1.1481 0 2.7717 -1.5308 0 3.6956
  [4,16,-2.8284,0,2.8284,-2.1213,0,2.1213,-1.1481,0,2.7717,-1.5308,0,3.6956],
// 4 16 -3.6956 0 1.5308 -2.7717 0 1.1481 -2.1213 0 2.1213 -2.8284 0 2.8284
  [4,16,-3.6956,0,1.5308,-2.7717,0,1.1481,-2.1213,0,2.1213,-2.8284,0,2.8284],
// 4 16 -4 0 0 -3 0 0 -2.7717 0 1.1481 -3.6956 0 1.5308
  [4,16,-4,0,0,-3,0,0,-2.7717,0,1.1481,-3.6956,0,1.5308],
// 4 16 -3.6956 0 -1.5308 -2.7717 0 -1.1481 -3 0 0 -4 0 0
  [4,16,-3.6956,0,-1.5308,-2.7717,0,-1.1481,-3,0,0,-4,0,0],
// 4 16 -2.8284 0 -2.8284 -2.1213 0 -2.1213 -2.7717 0 -1.1481 -3.6956 0 -1.5308
  [4,16,-2.8284,0,-2.8284,-2.1213,0,-2.1213,-2.7717,0,-1.1481,-3.6956,0,-1.5308],
// 4 16 -1.5308 0 -3.6956 -1.1481 0 -2.7717 -2.1213 0 -2.1213 -2.8284 0 -2.8284
  [4,16,-1.5308,0,-3.6956,-1.1481,0,-2.7717,-2.1213,0,-2.1213,-2.8284,0,-2.8284],
// 4 16 0 0 -4 0 0 -3 -1.1481 0 -2.7717 -1.5308 0 -3.6956
  [4,16,0,0,-4,0,0,-3,-1.1481,0,-2.7717,-1.5308,0,-3.6956],
// 4 16 1.5308 0 -3.6956 1.1481 0 -2.7717 0 0 -3 0 0 -4
  [4,16,1.5308,0,-3.6956,1.1481,0,-2.7717,0,0,-3,0,0,-4],
// 4 16 2.8284 0 -2.8284 2.1213 0 -2.1213 1.1481 0 -2.7717 1.5308 0 -3.6956
  [4,16,2.8284,0,-2.8284,2.1213,0,-2.1213,1.1481,0,-2.7717,1.5308,0,-3.6956],
// 4 16 3.6956 0 -1.5308 2.7717 0 -1.1481 2.1213 0 -2.1213 2.8284 0 -2.8284
  [4,16,3.6956,0,-1.5308,2.7717,0,-1.1481,2.1213,0,-2.1213,2.8284,0,-2.8284],
// 4 16 4 0 0 3 0 0 2.7717 0 -1.1481 3.6956 0 -1.5308
  [4,16,4,0,0,3,0,0,2.7717,0,-1.1481,3.6956,0,-1.5308],
// 4 16 3.6956 0 1.5308 2.7717 0 1.1481 3 0 0 4 0 0
  [4,16,3.6956,0,1.5308,2.7717,0,1.1481,3,0,0,4,0,0],
// 4 16 2.8284 0 2.8284 2.1213 0 2.1213 2.7717 0 1.1481 3.6956 0 1.5308
  [4,16,2.8284,0,2.8284,2.1213,0,2.1213,2.7717,0,1.1481,3.6956,0,1.5308],
// 4 16 1.5308 0 3.6956 1.1481 0 2.7717 2.1213 0 2.1213 2.8284 0 2.8284
  [4,16,1.5308,0,3.6956,1.1481,0,2.7717,2.1213,0,2.1213,2.8284,0,2.8284],
// 4 16 0 0 4 0 0 3 1.1481 0 2.7717 1.5308 0 3.6956
  [4,16,0,0,4,0,0,3,1.1481,0,2.7717,1.5308,0,3.6956],
// 0
];
module ldraw_lib__4_4ring3(step=0, col=false, unit=2/5, alt=false, line=0.2, solid=!$preview)
    makepoly(ldraw_lib__4_4ring3(solid), step=step, col=col, unit=unit, alt=alt, line=line, solid=solid);
ldraw_lib__4_4ring3(line=0.2);
// file: ../p/4-4cylo.scad
use <../lib.scad>
use <4-4cyli.scad>
use <4-4edge.scad>
$fa=1; $fs=0.2;
function ldraw_lib__4_4cylo(realsolid=false) = [
// 0 Cylinder Open 1.0
// 0 Name: 4-4cylo.dat
// 0 Author: Mark Kennedy [mkennedy]
// 0 !LDRAW_ORG Primitive UPDATE 2010-01
// 0 !LICENSE Licensed under CC BY 2.0 and CC BY 4.0 : see CAreadme.txt
// 
// 0 BFC CERTIFY CCW
  [0,"BFC","CERTIFY"],
  [0,"BFC","CCW"],
// 
// 0 !HISTORY 2010-04-05 [PTadmin] Official Update 2010-01
// 
// 
// 1 16 0 0 0 1 0 0 0 1 0 0 0 1 4-4edge.dat
  [1,16,0,0,0,1,0,0,0,1,0,0,0,1, ldraw_lib__4_4edge(realsolid)],
// 1 16 0 1 0 1 0 0 0 1 0 0 0 1 4-4edge.dat
  [1,16,0,1,0,1,0,0,0,1,0,0,0,1, ldraw_lib__4_4edge(realsolid)],
// 1 16 0 0 0 1 0 0 0 1 0 0 0 1 4-4cyli.dat
  [1,16,0,0,0,1,0,0,0,1,0,0,0,1, ldraw_lib__4_4cyli(realsolid)],
// 0
];
module ldraw_lib__4_4cylo(step=0, col=false, unit=2/5, alt=false, line=0.2, solid=!$preview)
    makepoly(ldraw_lib__4_4cylo(solid), step=step, col=col, unit=unit, alt=alt, line=line, solid=solid);
ldraw_lib__4_4cylo(line=0.2);
// main file
use <../lib.scad>
use <../p/4-4cylo.scad>
use <../p/4-4ring3.scad>
use <../p/4-4ring4.scad>
$fa=1; $fs=0.2;
function ldraw_lib__u9260(realsolid=false) = [
// 0 ~Turntable  4 x  4 Centre Connector
// 0 Name: u9260.dat
// 0 Author: Max Martin Richter [MMR1988]
// 0 !LDRAW_ORG Part UPDATE 2013-01
// 0 !LICENSE Licensed under CC BY 2.0 and CC BY 4.0 : see CAreadme.txt
// 
// 0 BFC CERTIFY CCW
  [0,"BFC","CERTIFY"],
  [0,"BFC","CCW"],
// 
// 0 !HISTORY 2013-07-21 [PTadmin] Official Update 2013-01
// 
// 
// 1 16 0 0 0 6.25 0 0 0 12.5 0 0 0 6.25 4-4cylo.dat
  [1,16,0,0,0,6.25,0,0,0,12.5,0,0,0,6.25, ldraw_lib__4_4cylo(realsolid)],
// 0 BFC INVERTNEXT
  [0,"BFC","INVERTNEXT"],
// 1 16 0 0 0 3.75 0 0 0 12.5 0 0 0 3.75 4-4cylo.dat
  [1,16,0,0,0,3.75,0,0,0,12.5,0,0,0,3.75, ldraw_lib__4_4cylo(realsolid)],
// 
// 1 16 0 0 0 1.25 0 0 0 1 0 0 0 1.25 4-4ring3.dat
  [1,16,0,0,0,1.25,0,0,0,1,0,0,0,1.25, ldraw_lib__4_4ring3(realsolid)],
// 1 16 0 0 0 1.25 0 0 0 1 0 0 0 1.25 4-4ring4.dat
  [1,16,0,0,0,1.25,0,0,0,1,0,0,0,1.25, ldraw_lib__4_4ring4(realsolid)],
// 
// 1 16 0 12.5 0 1.25 0 0 0 -1 0 0 0 1.25 4-4ring3.dat
  [1,16,0,12.5,0,1.25,0,0,0,-1,0,0,0,1.25, ldraw_lib__4_4ring3(realsolid)],
// 1 16 0 12.5 0 1.25 0 0 0 -1 0 0 0 1.25 4-4ring4.dat
  [1,16,0,12.5,0,1.25,0,0,0,-1,0,0,0,1.25, ldraw_lib__4_4ring4(realsolid)],
];
module ldraw_lib__u9260(step=0, col=false, unit=2/5, alt=false, line=0.2, solid=!$preview)
    makepoly(ldraw_lib__u9260(solid), step=step, col=col, unit=unit, alt=alt, line=line, solid=solid);
ldraw_lib__u9260(line=0.2);
